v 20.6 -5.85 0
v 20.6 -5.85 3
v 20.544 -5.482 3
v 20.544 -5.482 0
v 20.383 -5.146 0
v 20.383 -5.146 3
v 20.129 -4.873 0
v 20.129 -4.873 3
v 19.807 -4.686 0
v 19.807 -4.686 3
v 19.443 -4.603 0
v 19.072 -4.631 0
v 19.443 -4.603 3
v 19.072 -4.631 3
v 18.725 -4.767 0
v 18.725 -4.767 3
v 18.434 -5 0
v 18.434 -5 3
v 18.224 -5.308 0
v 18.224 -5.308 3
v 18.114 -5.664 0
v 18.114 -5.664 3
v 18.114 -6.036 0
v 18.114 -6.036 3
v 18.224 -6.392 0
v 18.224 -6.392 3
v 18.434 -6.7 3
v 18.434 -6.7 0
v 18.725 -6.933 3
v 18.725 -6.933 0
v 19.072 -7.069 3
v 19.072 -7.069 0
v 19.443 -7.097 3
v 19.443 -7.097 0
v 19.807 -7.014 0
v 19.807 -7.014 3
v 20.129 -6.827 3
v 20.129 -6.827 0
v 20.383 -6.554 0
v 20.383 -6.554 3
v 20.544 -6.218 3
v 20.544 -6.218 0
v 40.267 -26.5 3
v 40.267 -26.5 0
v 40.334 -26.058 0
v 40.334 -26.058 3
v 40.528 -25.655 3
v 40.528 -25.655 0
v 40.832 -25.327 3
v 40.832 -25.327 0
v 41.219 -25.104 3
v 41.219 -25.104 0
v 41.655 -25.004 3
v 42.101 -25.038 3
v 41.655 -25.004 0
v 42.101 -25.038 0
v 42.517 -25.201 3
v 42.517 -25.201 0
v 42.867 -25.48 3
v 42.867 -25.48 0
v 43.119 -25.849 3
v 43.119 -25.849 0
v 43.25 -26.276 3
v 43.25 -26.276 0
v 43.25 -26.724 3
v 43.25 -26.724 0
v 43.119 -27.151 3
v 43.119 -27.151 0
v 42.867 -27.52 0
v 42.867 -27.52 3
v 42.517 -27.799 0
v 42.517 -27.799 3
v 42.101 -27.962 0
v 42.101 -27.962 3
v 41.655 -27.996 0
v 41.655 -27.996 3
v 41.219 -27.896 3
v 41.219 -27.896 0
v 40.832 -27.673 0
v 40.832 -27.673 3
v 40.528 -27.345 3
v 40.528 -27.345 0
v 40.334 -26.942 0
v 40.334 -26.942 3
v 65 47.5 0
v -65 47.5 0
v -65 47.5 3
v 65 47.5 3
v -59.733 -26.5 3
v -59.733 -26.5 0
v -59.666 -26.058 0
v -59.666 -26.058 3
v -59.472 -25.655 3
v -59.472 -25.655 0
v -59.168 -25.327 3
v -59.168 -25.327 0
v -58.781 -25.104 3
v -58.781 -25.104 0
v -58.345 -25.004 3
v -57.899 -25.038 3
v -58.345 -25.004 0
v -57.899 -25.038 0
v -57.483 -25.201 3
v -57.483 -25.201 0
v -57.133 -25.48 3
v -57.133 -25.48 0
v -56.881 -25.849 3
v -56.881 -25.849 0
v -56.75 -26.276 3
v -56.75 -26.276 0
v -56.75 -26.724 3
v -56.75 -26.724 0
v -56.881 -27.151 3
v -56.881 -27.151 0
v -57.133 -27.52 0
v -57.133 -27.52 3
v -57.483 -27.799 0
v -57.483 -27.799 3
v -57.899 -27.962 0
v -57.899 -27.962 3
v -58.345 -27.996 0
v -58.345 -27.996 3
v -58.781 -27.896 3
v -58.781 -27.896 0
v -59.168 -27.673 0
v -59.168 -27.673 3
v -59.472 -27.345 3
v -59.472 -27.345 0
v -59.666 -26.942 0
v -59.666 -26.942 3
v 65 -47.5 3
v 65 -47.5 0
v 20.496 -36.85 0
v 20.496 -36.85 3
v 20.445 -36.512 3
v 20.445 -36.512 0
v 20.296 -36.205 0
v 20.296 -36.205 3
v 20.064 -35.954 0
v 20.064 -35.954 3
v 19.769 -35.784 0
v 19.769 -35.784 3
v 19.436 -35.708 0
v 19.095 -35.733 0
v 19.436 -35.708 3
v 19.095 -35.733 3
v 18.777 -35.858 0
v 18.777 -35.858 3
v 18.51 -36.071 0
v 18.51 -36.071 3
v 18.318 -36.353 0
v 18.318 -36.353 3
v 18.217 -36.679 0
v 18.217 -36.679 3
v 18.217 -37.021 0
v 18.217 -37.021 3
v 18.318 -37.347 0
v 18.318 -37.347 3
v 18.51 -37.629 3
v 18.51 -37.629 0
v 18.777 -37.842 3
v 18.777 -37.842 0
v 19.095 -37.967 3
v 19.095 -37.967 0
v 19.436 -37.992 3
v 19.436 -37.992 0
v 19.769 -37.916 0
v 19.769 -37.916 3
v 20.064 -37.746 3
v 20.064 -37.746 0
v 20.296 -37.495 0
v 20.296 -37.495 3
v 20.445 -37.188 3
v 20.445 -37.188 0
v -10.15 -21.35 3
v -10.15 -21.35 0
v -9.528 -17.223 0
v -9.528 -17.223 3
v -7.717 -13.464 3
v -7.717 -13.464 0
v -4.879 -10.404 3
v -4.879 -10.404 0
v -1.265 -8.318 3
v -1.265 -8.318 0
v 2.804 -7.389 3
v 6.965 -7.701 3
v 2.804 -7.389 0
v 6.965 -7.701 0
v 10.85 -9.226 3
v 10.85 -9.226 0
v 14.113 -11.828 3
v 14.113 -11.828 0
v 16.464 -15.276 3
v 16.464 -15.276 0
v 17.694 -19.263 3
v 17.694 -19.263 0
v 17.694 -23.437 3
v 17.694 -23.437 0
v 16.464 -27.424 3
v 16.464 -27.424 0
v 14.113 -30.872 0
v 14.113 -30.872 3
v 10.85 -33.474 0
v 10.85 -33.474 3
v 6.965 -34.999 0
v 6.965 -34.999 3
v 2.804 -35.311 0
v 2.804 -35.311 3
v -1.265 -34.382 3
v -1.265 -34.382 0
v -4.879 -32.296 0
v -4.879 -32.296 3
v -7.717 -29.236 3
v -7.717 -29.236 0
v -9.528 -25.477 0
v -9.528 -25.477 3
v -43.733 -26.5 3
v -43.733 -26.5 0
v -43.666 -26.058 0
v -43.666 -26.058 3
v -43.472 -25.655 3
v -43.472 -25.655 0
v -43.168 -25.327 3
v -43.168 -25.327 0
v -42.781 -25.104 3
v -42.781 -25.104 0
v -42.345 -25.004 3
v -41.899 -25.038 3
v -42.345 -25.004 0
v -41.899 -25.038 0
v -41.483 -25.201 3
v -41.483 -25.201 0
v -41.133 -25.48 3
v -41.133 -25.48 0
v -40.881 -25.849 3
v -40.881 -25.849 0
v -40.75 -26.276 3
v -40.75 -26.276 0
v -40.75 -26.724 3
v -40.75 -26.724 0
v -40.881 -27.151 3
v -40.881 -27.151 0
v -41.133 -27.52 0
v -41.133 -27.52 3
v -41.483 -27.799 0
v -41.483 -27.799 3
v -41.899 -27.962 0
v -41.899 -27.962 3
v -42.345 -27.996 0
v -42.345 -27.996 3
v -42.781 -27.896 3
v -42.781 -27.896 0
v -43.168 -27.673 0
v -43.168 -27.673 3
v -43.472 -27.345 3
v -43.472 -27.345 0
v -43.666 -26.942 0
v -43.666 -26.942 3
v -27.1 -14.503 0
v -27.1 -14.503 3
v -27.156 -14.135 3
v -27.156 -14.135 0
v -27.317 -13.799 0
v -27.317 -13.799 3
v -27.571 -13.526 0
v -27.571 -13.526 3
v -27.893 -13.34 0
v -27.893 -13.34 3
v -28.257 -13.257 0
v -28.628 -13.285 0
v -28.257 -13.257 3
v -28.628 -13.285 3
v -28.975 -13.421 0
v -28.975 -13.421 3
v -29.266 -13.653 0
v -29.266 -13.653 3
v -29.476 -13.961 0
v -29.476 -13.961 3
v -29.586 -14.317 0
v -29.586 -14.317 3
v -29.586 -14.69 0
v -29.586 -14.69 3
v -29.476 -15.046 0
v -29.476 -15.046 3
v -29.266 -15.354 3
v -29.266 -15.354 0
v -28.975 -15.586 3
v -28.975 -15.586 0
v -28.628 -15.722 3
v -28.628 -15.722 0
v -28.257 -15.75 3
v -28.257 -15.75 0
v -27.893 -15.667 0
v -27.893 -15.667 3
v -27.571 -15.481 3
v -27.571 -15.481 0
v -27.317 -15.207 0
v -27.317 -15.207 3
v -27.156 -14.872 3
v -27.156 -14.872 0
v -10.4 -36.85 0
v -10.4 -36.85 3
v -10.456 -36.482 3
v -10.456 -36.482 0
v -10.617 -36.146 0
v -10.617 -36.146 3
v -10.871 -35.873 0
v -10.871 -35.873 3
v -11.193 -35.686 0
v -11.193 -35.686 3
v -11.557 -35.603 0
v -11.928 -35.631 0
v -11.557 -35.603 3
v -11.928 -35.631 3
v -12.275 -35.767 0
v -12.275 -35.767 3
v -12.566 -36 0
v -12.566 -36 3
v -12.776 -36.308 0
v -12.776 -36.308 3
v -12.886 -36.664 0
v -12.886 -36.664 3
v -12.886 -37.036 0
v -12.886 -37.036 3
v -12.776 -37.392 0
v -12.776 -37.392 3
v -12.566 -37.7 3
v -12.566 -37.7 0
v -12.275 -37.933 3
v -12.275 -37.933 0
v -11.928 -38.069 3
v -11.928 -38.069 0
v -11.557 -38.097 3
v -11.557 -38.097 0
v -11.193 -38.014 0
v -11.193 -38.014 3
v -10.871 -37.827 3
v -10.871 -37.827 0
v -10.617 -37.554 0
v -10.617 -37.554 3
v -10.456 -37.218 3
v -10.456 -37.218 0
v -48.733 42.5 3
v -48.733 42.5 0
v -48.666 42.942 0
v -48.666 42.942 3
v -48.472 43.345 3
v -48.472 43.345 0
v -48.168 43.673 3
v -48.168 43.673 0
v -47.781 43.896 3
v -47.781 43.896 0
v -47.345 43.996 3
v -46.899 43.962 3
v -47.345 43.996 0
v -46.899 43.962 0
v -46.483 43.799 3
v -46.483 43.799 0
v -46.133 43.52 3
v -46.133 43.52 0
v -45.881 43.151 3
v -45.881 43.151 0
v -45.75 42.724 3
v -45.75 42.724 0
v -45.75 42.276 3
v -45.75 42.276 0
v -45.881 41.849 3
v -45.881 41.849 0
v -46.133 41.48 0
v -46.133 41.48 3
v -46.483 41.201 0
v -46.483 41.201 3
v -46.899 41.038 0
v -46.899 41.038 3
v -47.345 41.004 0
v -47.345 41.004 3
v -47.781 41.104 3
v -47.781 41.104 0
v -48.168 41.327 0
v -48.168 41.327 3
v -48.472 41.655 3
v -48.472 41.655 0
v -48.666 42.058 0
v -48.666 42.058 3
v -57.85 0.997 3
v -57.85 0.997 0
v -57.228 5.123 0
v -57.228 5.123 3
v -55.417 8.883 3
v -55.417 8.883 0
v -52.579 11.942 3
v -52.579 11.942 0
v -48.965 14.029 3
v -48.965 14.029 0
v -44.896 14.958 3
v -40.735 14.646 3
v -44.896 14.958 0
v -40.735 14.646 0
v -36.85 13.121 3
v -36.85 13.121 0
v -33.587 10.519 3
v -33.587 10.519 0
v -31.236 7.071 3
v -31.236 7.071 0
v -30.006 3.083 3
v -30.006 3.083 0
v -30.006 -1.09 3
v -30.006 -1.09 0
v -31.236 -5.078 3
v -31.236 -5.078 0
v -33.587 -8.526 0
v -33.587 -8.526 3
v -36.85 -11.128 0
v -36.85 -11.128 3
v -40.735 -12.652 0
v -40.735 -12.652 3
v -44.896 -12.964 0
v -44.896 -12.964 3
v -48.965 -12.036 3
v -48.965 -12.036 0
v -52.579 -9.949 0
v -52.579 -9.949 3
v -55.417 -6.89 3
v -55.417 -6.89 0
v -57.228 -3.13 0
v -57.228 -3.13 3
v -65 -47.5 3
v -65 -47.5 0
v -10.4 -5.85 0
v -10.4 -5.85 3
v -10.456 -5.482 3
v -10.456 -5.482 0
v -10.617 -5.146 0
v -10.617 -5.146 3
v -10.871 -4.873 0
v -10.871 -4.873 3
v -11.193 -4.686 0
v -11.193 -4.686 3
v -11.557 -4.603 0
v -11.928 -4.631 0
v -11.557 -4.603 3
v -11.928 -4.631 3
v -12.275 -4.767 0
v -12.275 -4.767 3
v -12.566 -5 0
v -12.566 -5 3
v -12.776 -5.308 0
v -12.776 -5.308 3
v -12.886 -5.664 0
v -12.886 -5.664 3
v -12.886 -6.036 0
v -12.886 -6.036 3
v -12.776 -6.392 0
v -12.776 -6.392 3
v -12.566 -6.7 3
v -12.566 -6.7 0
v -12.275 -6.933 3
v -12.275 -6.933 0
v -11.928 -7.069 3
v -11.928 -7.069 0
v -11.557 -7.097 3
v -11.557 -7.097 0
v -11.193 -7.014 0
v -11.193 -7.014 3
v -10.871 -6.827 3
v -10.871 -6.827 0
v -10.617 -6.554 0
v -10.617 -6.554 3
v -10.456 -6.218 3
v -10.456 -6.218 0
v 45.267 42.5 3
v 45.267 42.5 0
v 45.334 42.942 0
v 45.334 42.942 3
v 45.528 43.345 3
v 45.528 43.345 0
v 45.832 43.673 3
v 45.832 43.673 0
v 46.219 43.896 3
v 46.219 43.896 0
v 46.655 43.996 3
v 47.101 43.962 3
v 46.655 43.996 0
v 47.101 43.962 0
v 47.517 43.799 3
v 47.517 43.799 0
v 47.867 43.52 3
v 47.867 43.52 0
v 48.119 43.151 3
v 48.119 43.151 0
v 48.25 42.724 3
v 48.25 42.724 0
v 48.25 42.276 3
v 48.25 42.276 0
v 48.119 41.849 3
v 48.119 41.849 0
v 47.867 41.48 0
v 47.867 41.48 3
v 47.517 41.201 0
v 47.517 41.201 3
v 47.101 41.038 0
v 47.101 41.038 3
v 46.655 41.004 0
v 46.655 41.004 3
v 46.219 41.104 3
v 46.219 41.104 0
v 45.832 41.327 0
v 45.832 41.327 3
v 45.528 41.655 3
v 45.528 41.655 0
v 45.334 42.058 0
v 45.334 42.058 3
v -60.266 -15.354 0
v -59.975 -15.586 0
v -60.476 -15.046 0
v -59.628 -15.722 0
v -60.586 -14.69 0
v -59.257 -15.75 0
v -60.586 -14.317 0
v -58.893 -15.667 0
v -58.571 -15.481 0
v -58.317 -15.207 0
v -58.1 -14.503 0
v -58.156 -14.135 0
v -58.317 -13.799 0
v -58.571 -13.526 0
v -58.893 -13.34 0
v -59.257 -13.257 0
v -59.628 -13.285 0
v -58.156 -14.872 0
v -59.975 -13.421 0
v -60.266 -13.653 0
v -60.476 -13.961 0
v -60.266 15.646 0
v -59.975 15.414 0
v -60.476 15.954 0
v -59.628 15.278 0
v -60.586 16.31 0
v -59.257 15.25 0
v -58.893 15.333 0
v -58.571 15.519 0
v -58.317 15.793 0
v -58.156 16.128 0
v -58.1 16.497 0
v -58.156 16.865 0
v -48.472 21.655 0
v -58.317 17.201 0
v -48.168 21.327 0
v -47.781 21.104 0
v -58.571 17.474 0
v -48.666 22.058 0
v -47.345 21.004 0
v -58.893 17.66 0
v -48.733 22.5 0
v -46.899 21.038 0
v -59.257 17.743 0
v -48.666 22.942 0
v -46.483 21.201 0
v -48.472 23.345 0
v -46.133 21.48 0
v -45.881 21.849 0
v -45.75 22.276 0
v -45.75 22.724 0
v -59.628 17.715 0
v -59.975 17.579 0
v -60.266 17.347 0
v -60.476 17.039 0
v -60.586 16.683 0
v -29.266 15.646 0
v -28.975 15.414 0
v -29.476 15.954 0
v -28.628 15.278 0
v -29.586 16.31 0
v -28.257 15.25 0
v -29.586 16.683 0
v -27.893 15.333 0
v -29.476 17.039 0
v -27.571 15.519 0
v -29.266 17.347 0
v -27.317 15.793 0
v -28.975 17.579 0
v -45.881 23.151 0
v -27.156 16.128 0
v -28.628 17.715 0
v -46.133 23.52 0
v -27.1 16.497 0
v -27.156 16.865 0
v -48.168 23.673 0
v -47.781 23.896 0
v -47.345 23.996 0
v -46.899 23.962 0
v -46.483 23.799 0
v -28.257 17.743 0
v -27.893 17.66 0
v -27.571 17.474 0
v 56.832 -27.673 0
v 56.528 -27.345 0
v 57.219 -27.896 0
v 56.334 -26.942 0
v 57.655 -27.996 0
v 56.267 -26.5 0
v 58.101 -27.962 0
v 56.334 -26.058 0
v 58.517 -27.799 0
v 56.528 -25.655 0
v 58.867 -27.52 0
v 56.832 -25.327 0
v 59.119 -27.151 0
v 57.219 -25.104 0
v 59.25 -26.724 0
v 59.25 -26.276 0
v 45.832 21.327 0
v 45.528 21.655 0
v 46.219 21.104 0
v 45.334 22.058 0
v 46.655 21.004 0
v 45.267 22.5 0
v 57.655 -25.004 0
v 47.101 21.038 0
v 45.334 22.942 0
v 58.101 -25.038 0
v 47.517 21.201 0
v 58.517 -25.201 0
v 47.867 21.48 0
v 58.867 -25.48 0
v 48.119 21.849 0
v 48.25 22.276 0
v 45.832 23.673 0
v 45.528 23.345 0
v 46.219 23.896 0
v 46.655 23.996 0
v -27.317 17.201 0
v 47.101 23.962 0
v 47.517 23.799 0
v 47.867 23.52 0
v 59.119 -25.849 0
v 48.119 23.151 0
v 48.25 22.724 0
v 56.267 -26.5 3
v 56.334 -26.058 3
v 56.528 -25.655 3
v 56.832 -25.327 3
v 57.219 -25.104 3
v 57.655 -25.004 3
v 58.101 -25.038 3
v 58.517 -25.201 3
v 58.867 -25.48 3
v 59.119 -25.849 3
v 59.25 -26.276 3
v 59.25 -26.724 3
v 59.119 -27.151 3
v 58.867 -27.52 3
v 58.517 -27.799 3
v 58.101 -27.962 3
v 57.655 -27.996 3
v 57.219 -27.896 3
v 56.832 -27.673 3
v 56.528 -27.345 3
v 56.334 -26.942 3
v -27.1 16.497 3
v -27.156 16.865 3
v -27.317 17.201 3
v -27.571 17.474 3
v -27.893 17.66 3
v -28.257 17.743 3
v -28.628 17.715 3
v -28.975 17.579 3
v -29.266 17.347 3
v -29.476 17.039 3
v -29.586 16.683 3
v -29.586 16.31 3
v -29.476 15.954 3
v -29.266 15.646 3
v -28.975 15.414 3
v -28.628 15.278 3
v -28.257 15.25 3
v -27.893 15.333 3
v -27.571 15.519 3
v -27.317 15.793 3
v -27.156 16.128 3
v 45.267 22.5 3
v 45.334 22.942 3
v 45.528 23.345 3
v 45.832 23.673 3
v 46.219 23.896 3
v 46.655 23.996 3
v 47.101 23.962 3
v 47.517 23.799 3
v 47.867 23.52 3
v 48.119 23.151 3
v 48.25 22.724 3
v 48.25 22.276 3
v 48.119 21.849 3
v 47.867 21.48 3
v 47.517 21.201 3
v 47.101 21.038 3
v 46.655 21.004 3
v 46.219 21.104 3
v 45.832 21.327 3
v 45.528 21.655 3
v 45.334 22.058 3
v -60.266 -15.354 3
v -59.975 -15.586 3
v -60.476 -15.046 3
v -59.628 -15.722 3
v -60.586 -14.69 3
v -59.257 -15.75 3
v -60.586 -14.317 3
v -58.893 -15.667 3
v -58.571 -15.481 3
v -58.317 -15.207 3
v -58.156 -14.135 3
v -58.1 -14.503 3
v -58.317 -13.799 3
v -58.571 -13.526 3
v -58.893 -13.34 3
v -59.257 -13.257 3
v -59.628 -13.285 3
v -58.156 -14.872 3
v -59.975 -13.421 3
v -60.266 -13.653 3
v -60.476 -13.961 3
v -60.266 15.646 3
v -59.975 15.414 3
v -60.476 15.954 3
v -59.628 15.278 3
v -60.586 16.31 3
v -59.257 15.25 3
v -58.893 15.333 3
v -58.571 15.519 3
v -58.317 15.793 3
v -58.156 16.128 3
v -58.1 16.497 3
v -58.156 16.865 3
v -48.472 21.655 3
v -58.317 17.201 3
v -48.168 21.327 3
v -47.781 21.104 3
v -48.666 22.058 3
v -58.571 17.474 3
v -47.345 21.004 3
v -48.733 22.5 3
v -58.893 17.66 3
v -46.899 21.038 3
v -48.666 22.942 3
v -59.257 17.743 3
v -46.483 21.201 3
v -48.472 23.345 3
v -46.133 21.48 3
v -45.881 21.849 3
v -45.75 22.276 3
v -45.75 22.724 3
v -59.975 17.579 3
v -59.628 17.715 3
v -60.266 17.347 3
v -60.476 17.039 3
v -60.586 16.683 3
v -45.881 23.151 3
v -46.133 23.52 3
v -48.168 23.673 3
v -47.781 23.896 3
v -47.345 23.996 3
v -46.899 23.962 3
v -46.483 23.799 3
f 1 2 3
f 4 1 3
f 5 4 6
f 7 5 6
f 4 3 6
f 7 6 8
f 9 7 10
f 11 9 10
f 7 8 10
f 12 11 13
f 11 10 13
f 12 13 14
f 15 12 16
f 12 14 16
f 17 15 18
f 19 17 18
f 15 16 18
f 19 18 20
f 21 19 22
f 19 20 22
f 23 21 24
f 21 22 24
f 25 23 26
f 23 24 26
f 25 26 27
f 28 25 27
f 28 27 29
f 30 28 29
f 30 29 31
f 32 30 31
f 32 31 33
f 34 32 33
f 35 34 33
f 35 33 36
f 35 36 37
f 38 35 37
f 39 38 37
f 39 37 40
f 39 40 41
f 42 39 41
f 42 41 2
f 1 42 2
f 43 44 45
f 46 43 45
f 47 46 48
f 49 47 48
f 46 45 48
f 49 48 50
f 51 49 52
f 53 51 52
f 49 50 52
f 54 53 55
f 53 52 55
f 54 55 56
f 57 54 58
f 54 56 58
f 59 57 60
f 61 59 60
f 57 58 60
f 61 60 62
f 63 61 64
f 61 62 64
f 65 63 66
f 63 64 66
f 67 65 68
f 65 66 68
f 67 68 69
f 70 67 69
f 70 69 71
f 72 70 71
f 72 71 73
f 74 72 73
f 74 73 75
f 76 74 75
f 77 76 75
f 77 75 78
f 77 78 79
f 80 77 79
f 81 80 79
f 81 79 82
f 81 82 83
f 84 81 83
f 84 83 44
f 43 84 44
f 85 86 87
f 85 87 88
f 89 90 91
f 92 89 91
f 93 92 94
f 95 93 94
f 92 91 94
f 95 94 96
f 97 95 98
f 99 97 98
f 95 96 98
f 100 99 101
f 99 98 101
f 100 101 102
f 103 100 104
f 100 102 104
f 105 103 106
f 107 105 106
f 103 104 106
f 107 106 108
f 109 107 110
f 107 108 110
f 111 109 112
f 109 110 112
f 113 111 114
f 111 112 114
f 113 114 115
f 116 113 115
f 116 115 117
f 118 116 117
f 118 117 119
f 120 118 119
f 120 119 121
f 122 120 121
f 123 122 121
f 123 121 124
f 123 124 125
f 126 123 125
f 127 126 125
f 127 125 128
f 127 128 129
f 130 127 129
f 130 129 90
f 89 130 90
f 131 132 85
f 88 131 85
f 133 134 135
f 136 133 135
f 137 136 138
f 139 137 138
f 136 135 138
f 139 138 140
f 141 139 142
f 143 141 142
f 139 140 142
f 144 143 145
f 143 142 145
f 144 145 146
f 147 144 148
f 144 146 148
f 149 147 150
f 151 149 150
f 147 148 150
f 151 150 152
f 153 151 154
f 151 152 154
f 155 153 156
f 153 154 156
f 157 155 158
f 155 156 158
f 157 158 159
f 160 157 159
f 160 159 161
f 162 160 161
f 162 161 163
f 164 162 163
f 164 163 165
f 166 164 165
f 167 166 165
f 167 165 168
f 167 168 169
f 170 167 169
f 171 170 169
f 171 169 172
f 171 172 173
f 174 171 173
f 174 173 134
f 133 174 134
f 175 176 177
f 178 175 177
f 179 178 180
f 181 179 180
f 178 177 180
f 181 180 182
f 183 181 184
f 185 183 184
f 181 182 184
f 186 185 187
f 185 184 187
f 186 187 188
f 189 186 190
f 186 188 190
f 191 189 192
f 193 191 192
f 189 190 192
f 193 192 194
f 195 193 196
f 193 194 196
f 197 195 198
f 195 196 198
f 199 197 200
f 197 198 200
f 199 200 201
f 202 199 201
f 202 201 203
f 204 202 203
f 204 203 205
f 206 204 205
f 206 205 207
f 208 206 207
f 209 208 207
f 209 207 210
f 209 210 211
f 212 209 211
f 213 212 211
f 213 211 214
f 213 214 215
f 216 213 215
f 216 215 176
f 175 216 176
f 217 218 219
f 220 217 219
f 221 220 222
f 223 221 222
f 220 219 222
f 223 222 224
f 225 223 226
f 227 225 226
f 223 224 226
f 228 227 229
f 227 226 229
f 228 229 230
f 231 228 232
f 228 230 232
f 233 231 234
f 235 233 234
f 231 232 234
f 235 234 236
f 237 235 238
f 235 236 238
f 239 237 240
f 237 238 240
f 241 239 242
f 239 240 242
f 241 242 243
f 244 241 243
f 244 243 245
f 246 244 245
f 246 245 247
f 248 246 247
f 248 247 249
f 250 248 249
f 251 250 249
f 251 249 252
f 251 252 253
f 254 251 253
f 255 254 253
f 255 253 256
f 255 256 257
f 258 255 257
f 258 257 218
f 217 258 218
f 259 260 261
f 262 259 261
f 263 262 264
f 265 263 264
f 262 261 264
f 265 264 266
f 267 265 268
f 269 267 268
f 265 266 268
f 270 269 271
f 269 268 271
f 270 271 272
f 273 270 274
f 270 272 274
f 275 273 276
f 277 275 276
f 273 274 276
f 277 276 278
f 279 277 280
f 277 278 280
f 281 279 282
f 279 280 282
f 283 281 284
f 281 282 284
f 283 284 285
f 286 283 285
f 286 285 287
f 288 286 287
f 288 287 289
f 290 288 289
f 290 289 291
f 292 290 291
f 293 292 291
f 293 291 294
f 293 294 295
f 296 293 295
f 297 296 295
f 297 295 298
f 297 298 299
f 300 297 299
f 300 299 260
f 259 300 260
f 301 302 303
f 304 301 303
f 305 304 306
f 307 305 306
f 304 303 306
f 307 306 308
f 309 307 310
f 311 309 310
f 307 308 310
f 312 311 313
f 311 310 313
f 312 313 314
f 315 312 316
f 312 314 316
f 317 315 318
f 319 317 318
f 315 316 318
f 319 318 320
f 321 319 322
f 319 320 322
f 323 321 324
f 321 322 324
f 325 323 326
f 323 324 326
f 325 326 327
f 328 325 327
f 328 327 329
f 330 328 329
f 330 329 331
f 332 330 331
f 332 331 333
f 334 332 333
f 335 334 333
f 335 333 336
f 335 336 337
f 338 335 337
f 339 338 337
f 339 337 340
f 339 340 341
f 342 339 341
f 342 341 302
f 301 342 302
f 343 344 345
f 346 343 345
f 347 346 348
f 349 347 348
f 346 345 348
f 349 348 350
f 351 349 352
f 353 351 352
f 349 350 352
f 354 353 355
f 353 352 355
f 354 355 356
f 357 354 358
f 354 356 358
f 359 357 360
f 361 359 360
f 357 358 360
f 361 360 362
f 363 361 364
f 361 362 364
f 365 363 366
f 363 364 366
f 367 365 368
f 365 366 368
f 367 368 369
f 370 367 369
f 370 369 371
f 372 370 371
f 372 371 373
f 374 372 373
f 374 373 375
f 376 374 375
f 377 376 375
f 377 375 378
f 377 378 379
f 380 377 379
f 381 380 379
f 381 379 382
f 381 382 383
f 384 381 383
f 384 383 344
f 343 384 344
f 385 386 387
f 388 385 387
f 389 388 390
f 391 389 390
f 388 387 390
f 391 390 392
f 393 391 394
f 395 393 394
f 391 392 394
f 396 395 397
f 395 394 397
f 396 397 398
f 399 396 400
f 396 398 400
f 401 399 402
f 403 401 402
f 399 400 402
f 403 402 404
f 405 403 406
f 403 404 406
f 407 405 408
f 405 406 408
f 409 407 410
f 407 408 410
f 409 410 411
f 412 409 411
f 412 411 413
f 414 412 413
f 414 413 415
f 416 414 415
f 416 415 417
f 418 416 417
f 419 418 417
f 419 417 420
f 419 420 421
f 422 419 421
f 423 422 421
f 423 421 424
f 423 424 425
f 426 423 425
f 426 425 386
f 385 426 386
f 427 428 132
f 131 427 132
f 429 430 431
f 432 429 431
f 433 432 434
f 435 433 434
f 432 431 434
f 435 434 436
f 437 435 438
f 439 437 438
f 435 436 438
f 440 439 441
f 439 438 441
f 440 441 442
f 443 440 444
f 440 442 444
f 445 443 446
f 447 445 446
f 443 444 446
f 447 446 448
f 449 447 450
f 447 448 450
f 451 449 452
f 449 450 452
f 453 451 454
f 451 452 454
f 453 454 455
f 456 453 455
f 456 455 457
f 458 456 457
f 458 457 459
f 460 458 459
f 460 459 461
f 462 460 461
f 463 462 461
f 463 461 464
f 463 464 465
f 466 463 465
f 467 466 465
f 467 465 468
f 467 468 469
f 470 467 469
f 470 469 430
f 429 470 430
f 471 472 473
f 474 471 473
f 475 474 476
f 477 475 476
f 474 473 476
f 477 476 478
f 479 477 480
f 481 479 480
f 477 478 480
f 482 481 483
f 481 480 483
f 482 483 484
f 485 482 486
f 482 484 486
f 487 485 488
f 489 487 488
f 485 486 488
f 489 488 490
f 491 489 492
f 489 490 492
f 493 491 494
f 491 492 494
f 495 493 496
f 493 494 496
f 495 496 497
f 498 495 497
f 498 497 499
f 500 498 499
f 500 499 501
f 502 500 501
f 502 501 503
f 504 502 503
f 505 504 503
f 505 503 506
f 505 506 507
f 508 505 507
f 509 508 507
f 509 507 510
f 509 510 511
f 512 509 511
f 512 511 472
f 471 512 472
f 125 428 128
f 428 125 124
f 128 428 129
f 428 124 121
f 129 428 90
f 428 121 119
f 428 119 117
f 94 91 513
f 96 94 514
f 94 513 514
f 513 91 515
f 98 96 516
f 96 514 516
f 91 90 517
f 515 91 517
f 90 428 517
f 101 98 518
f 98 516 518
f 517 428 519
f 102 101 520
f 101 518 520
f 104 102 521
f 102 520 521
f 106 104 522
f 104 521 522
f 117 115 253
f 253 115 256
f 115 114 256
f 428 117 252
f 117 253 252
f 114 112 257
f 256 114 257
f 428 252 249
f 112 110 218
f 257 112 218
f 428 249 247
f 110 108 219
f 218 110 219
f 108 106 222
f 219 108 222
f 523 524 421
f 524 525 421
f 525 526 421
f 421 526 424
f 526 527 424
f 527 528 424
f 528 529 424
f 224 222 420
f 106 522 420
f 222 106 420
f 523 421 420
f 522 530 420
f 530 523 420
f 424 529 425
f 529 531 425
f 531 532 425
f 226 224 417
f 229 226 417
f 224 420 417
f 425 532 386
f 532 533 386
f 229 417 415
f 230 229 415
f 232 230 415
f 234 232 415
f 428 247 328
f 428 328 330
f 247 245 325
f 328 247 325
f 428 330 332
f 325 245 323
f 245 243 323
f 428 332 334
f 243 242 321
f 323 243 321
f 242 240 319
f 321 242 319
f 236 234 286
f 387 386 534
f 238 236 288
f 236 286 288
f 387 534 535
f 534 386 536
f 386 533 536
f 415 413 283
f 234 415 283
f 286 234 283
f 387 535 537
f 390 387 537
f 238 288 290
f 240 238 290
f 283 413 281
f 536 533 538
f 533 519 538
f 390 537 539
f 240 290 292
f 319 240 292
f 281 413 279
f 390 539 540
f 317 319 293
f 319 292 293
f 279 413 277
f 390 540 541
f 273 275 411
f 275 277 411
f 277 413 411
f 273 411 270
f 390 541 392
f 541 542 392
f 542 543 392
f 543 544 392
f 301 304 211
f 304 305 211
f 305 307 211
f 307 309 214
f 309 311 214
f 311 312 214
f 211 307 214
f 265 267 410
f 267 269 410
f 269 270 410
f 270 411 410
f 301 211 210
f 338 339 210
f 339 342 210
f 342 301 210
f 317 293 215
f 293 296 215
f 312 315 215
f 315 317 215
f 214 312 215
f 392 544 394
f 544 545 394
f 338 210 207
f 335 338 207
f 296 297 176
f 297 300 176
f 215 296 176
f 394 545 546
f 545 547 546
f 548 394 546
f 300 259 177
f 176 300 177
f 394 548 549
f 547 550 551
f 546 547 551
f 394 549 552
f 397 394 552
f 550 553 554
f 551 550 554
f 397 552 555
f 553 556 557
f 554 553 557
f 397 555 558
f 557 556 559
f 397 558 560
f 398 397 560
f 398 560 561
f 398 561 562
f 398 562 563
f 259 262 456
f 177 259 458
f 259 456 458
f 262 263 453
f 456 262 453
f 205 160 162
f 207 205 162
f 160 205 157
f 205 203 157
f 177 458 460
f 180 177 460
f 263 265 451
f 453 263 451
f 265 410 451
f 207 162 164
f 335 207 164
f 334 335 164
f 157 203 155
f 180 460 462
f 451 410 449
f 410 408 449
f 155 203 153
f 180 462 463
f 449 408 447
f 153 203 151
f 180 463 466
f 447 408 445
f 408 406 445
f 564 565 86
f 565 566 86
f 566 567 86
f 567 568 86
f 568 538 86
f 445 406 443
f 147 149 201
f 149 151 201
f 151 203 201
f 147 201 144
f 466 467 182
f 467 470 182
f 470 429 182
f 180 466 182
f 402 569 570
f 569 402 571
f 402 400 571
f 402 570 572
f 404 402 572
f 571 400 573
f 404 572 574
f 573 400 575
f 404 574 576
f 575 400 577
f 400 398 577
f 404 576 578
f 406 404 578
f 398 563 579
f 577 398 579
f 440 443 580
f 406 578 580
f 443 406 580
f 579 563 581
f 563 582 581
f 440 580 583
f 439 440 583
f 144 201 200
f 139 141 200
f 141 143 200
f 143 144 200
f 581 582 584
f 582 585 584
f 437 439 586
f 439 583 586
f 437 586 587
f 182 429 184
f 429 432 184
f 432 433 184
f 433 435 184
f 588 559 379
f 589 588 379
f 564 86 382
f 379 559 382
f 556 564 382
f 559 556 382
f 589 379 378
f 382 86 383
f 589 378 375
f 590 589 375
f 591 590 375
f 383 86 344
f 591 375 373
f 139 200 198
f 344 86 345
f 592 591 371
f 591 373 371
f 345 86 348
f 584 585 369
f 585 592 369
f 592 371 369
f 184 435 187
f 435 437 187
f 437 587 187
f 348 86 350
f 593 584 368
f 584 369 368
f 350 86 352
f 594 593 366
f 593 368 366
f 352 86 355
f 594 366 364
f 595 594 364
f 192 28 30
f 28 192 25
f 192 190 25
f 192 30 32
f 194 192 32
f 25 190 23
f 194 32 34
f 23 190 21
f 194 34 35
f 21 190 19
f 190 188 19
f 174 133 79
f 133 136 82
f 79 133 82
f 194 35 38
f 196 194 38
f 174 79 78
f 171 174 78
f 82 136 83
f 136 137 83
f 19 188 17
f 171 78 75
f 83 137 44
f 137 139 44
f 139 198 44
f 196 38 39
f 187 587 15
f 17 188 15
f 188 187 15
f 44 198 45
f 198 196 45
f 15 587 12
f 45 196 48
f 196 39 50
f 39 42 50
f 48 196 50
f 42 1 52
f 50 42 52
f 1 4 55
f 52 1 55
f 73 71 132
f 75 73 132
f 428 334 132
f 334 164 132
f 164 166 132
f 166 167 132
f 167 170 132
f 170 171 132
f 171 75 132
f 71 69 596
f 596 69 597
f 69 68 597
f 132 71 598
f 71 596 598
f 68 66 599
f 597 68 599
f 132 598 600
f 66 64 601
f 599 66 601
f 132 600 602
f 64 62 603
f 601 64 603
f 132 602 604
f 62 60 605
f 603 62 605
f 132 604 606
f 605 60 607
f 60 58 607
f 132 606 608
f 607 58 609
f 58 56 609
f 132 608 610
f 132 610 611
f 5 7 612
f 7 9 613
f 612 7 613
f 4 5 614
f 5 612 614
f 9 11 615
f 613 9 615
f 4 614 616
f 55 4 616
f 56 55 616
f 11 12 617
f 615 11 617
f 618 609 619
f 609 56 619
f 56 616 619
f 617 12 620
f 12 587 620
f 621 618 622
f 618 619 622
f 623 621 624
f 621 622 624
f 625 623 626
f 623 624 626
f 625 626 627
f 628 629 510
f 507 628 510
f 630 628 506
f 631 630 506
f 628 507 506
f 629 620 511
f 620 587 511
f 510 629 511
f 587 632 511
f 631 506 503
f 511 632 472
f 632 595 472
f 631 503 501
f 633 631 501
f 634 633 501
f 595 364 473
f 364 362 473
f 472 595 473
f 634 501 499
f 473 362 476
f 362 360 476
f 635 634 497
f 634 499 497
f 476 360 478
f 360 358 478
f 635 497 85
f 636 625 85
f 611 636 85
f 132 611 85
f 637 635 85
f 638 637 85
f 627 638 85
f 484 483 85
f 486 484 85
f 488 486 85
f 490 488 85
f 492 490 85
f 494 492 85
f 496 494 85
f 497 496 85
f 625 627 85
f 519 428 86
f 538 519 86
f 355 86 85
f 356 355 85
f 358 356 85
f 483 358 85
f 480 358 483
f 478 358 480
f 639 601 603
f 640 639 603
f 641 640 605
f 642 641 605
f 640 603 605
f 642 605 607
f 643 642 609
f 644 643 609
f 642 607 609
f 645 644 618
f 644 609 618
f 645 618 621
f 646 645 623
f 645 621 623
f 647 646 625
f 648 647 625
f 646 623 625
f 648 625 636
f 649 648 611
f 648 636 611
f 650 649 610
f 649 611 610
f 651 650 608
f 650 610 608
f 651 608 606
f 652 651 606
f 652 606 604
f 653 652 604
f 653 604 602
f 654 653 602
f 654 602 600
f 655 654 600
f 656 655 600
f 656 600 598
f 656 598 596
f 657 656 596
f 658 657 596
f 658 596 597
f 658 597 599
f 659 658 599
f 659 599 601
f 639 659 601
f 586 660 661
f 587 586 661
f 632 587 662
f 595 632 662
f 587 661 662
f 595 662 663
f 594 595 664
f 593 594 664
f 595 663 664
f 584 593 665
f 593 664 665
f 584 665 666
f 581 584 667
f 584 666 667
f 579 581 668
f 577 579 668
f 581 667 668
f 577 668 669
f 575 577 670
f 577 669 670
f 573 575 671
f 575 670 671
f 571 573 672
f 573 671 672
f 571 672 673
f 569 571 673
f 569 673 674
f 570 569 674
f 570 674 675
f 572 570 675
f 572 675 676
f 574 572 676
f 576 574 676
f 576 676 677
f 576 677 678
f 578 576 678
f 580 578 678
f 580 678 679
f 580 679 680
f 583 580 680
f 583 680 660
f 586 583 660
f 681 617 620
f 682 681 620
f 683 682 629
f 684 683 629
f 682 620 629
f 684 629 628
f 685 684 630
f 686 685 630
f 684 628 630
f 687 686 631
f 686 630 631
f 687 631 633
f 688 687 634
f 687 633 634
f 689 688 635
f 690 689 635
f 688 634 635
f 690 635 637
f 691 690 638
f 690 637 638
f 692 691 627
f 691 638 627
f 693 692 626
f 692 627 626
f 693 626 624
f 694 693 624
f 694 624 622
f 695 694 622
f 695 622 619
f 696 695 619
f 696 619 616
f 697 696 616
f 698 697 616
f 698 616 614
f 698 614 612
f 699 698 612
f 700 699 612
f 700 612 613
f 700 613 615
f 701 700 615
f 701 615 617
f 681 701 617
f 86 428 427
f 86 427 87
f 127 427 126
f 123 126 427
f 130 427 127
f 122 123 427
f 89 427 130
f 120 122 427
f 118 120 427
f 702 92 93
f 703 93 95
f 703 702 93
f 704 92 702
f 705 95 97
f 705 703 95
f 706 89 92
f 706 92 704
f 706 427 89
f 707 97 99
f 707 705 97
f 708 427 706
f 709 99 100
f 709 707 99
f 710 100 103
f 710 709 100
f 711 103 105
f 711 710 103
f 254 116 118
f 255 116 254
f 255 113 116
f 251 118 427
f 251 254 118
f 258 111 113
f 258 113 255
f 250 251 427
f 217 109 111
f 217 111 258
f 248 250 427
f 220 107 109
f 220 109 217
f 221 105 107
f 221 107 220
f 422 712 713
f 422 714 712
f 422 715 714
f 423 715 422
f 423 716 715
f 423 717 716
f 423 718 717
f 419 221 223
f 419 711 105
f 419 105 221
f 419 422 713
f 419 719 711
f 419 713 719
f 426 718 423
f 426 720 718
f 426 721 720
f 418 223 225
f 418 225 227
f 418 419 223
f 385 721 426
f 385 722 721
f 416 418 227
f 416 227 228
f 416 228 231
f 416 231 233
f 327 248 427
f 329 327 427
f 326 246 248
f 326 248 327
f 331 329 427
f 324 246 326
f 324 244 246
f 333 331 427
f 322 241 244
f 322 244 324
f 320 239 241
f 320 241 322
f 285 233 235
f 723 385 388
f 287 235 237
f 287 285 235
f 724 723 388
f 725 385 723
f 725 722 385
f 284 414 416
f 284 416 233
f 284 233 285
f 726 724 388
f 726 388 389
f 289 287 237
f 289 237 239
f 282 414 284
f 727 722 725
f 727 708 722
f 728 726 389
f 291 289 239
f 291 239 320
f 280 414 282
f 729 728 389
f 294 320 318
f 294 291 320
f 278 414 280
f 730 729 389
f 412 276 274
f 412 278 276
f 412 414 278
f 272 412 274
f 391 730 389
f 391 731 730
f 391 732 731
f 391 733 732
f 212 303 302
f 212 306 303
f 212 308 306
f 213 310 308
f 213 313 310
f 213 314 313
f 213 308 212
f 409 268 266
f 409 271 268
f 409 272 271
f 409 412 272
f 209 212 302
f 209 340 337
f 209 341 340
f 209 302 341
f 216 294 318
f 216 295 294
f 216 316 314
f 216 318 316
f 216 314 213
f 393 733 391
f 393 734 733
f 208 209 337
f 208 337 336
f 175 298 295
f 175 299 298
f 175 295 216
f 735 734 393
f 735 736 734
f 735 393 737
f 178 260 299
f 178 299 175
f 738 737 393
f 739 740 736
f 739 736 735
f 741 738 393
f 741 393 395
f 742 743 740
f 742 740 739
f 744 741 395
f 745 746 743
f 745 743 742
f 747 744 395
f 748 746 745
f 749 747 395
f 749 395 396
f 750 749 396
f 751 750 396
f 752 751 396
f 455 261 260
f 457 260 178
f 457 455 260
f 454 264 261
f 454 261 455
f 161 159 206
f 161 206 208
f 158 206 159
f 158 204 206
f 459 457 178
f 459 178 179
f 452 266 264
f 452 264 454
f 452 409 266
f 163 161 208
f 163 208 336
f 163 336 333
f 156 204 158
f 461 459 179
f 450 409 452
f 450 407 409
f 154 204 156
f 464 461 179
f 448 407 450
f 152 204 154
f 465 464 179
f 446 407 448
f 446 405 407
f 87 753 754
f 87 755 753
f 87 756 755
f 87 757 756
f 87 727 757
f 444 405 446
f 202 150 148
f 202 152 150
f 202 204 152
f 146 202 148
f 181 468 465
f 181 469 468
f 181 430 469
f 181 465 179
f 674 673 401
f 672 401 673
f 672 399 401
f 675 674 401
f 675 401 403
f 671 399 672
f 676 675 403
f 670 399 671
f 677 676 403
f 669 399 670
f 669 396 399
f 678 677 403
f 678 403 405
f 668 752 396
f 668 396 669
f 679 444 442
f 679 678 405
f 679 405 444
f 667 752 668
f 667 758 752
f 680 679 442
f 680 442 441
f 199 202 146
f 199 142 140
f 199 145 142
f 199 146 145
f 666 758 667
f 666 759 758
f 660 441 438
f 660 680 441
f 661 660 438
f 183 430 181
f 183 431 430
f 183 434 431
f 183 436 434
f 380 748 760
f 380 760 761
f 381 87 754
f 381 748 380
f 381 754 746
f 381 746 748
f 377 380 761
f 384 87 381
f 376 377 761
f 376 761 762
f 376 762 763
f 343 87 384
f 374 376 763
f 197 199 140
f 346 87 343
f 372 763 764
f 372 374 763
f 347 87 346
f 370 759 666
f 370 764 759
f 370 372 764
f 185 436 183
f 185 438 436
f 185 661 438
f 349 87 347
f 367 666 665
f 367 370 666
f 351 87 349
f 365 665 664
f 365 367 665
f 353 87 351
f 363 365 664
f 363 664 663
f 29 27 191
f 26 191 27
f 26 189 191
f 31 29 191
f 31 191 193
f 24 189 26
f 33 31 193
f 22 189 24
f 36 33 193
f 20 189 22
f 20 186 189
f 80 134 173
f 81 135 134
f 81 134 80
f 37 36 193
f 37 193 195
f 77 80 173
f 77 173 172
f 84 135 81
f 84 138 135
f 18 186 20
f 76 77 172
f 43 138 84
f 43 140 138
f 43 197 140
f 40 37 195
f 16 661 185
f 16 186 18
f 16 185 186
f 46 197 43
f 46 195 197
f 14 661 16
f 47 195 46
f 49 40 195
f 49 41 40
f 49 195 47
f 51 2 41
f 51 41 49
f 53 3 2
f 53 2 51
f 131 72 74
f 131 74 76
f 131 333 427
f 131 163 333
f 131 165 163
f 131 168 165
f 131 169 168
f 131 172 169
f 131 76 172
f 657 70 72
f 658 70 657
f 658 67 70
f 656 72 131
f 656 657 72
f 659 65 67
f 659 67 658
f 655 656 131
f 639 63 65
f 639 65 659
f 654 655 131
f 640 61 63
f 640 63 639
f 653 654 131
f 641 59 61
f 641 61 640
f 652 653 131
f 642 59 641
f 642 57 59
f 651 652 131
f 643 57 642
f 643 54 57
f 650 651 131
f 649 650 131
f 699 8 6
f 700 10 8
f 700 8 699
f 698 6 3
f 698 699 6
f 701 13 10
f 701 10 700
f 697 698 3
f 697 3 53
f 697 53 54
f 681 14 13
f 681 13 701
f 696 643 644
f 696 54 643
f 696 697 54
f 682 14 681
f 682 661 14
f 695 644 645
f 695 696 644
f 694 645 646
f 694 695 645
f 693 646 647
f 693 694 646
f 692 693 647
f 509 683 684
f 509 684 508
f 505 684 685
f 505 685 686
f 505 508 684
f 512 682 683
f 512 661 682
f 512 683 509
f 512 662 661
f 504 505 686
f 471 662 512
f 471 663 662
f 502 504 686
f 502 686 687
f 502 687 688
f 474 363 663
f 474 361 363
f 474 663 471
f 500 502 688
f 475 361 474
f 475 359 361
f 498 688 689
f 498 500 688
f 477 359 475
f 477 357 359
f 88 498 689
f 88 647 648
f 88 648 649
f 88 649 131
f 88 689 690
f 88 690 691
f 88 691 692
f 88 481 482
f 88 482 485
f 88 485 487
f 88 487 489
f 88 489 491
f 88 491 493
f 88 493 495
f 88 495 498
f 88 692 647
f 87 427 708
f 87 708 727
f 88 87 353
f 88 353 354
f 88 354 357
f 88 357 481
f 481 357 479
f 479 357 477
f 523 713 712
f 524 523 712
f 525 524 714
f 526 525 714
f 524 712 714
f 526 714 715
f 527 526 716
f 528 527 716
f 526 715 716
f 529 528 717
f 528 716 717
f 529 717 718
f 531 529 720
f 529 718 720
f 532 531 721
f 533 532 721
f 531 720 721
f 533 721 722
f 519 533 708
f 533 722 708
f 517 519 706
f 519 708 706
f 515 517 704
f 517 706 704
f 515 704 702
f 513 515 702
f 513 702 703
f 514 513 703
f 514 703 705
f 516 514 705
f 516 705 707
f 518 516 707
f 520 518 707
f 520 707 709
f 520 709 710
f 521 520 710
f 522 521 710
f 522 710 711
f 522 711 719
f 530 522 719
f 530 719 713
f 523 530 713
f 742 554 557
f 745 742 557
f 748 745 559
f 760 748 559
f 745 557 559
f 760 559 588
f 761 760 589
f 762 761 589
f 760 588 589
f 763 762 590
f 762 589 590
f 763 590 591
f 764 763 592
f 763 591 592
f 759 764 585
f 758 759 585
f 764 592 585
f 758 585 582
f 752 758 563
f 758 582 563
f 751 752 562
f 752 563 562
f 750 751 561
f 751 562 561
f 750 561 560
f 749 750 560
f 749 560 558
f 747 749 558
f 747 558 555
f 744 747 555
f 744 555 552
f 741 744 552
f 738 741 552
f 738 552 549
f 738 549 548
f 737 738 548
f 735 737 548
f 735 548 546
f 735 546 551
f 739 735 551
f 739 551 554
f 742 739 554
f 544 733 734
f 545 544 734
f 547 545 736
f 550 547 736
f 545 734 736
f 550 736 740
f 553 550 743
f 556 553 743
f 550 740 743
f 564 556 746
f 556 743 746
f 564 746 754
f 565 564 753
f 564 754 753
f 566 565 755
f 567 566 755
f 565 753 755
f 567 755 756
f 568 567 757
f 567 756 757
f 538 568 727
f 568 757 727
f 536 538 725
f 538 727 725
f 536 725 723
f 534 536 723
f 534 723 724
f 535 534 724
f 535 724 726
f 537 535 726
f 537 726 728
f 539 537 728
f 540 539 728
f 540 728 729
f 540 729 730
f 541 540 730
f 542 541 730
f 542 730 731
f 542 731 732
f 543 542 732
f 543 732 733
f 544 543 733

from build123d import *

# Parameters (mm, degrees)
SKETCH_1_W          = 130
SKETCH_1_H          = 95
EXTRUDE_1_DEPTH     = 3
SKETCH_3_R          = 1.5
CUT_EXTRUDE_2_DEPTH = 10
SKETCH_4_R          = 1.5
CUT_EXTRUDE_3_DEPTH = 10
SKETCH_5_R          = 14
CUT_EXTRUDE_4_DEPTH = 10
SKETCH_6_R          = 1.25
SKETCH_6_R_2        = 1.145522231
CUT_EXTRUDE_5_DEPTH = 10


with BuildPart() as part:
    # 草图1 → 凸台-拉伸1 (new body)
    with BuildSketch(Plane.XY):
        Rectangle(SKETCH_1_W, SKETCH_1_H)
    extrude(amount=EXTRUDE_1_DEPTH)

    # 草图3 → 切除-拉伸2 (cut)
    with BuildSketch(Plane(origin=(0, 0, 0), x_dir=(-1, 0, 0), z_dir=(0, 0, -1))):
        with Locations((-57.767112616, -26.5)):
            Circle(SKETCH_3_R)
        with Locations((-41.767112616, -26.5)):
            Circle(SKETCH_3_R)
        with Locations((42.232887384, -26.5)):
            Circle(SKETCH_3_R)
        with Locations((58.232887384, -26.5)):
            Circle(SKETCH_3_R)
    extrude(amount=-CUT_EXTRUDE_2_DEPTH, mode=Mode.SUBTRACT)

    # 草图4 → 切除-拉伸3 (cut)
    with BuildSketch(Plane(origin=(0, 0, 0), x_dir=(-1, 0, 0), z_dir=(0, 0, -1))):
        with Locations((-46.767112616, 42.5)):
            Circle(SKETCH_4_R)
        with Locations((-46.767112616, 22.5)):
            Circle(SKETCH_4_R)
        with Locations((47.232887384, 42.5)):
            Circle(SKETCH_4_R)
        with Locations((47.232887384, 22.5)):
            Circle(SKETCH_4_R)
    extrude(amount=-CUT_EXTRUDE_3_DEPTH, mode=Mode.SUBTRACT)

    # 草图5 → 切除-拉伸4 (cut)
    with BuildSketch(Plane(origin=(0, 0, 0), x_dir=(-1, 0, 0), z_dir=(0, 0, -1))):
        with Locations((-3.85, -21.35)):
            Circle(SKETCH_5_R)
        with Locations((43.85, 0.996699625)):
            Circle(SKETCH_5_R)
    extrude(amount=-CUT_EXTRUDE_4_DEPTH, mode=Mode.SUBTRACT)

    # 草图6 → 切除-拉伸5 (cut)
    with BuildSketch(Plane.XY.offset(3)):
        with Locations((-59.35, 16.496699625)):
            Circle(SKETCH_6_R)
        with Locations((-28.35, 16.496699625)):
            Circle(SKETCH_6_R)
        with Locations((-59.35, -14.503300375)):
            Circle(SKETCH_6_R)
        with Locations((-28.35, -14.503300375)):
            Circle(SKETCH_6_R)
        with Locations((-11.65, -5.85)):
            Circle(SKETCH_6_R)
        with Locations((19.35, -5.85)):
            Circle(SKETCH_6_R)
        with Locations((19.35, -36.85)):
            Circle(SKETCH_6_R_2)
        with Locations((-11.65, -36.85)):
            Circle(SKETCH_6_R)
    extrude(amount=-CUT_EXTRUDE_5_DEPTH, mode=Mode.SUBTRACT)


solid = part.part
